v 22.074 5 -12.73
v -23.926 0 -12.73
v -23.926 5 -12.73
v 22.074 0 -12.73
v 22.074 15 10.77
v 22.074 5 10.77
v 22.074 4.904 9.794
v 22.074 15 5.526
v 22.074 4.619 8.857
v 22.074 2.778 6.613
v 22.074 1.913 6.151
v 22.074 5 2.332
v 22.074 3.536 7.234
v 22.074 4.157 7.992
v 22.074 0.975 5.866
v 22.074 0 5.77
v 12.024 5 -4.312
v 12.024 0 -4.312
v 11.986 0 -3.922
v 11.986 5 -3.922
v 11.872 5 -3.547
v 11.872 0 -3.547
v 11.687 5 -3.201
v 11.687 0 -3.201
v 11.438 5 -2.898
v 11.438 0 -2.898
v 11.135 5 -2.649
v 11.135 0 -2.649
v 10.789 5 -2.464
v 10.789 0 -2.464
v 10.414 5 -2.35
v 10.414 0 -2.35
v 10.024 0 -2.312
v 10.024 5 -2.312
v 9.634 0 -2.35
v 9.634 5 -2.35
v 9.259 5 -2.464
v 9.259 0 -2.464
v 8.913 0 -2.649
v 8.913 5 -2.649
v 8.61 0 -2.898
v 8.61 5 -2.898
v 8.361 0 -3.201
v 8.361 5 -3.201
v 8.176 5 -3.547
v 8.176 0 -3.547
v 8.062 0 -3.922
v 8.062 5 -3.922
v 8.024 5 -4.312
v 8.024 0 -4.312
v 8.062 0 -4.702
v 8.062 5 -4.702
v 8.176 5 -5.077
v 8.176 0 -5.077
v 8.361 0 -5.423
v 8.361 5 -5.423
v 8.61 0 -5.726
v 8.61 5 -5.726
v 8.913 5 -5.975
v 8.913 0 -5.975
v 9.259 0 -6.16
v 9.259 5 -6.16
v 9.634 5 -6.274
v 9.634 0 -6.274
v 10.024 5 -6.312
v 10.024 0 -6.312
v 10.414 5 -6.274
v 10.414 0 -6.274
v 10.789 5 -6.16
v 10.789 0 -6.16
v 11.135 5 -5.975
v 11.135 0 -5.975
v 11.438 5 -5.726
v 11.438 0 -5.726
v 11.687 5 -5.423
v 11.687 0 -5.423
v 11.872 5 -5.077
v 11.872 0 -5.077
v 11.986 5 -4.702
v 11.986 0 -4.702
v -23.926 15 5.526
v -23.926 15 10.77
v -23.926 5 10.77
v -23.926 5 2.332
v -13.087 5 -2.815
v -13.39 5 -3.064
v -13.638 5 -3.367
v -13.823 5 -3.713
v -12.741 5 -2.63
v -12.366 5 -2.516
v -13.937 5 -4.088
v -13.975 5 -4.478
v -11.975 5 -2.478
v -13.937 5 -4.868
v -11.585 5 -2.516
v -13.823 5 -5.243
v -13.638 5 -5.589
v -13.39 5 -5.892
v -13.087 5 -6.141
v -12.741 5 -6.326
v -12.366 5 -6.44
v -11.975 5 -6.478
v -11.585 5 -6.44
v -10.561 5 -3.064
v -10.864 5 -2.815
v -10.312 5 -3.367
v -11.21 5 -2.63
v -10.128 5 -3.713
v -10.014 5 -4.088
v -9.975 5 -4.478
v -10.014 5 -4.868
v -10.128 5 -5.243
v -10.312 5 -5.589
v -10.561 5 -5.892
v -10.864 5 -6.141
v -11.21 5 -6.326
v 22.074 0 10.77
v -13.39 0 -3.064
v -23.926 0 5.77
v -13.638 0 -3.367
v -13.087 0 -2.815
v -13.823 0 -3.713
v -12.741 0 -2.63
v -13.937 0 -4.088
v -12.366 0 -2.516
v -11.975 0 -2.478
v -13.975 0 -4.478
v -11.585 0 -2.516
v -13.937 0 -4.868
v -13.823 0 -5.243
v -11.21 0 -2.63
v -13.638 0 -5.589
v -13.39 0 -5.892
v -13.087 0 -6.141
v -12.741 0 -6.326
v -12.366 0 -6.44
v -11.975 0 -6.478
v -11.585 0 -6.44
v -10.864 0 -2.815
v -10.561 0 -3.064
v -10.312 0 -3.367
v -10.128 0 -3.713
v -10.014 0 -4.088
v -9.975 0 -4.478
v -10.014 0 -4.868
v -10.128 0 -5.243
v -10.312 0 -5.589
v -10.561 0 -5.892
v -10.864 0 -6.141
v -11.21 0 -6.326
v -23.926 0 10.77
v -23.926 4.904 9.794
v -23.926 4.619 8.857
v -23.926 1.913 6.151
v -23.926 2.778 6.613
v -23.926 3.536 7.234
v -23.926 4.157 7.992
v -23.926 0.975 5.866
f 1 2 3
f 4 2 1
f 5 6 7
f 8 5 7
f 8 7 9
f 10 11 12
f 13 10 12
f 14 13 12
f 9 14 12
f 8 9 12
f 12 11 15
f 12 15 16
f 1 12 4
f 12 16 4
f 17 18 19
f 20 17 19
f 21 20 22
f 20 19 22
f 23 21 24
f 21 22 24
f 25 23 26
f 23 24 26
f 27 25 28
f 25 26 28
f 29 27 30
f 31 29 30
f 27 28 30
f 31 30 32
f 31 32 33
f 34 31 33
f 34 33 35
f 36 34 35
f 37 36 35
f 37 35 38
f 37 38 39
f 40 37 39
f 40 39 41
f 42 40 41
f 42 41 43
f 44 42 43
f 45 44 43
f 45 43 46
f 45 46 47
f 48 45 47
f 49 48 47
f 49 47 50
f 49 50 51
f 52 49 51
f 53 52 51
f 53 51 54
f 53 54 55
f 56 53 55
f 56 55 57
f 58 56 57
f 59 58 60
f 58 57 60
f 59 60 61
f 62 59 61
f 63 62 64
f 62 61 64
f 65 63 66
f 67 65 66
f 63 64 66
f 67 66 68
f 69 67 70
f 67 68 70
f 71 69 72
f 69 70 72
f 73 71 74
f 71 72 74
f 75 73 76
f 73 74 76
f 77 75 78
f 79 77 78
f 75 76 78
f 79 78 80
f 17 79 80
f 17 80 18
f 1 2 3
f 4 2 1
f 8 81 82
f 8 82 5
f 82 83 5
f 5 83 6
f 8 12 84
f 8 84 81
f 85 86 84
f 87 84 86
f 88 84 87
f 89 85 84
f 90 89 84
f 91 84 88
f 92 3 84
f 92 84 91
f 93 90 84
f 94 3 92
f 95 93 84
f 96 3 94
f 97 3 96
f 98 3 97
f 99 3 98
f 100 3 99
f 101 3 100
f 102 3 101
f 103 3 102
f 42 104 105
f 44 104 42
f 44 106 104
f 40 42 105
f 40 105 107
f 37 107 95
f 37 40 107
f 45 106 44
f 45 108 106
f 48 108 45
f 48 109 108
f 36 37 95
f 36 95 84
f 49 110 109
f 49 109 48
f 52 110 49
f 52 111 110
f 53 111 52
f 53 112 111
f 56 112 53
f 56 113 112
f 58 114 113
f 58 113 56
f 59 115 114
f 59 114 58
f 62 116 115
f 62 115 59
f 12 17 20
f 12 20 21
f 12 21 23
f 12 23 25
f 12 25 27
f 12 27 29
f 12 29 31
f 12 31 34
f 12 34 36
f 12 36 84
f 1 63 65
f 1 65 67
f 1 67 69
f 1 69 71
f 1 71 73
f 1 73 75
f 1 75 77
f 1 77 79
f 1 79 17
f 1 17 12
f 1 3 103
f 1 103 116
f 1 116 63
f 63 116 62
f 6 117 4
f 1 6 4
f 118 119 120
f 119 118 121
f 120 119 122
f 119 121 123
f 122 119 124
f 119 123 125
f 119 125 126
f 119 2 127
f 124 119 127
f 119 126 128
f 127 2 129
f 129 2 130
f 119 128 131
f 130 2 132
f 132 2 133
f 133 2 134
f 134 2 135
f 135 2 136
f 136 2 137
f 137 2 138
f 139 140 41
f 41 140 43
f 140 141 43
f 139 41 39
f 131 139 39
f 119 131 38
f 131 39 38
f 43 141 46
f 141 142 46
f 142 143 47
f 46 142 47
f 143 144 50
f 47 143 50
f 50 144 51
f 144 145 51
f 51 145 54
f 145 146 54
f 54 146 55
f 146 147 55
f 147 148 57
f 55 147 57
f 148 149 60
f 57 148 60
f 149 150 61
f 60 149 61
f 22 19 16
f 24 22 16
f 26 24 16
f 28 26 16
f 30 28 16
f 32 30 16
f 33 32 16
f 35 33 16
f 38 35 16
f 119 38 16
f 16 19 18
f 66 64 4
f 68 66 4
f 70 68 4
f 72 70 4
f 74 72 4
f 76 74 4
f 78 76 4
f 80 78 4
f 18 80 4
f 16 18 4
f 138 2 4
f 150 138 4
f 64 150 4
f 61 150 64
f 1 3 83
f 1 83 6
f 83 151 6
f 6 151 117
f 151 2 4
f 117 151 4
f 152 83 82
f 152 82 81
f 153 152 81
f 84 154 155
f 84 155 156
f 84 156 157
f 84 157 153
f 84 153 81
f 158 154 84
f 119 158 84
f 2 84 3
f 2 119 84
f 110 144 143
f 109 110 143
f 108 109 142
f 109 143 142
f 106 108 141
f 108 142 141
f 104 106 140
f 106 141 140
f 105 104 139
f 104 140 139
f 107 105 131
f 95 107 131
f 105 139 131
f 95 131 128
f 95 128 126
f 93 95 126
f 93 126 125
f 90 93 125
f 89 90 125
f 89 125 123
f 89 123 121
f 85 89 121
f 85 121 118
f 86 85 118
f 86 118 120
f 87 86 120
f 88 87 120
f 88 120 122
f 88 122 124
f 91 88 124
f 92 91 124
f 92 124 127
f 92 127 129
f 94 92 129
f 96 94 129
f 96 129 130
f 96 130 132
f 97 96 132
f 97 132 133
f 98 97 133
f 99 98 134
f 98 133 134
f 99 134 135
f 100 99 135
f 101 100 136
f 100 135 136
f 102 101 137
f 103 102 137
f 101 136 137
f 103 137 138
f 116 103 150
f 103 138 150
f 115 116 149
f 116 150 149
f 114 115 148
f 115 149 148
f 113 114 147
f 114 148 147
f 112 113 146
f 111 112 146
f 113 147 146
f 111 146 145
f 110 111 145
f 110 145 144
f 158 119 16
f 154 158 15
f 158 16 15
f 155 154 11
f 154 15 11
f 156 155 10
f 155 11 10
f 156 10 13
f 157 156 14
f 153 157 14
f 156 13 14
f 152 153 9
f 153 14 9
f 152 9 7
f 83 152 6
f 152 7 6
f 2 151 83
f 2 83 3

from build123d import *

# Parameters (mm, degrees)
SKETCH1_W               = 46
SKETCH1_H               = 23.5
BOSS_EXTRUDE1_DEPTH     = 5
SKETCH2_W               = 46
SKETCH2_H               = 10.437907818
BOSS_EXTRUDE2_DEPTH     = 10
SKETCH1_2_W             = 46
SKETCH1_2_H             = 23.5
BOSS_EXTRUDE3_DEPTH     = 5
SKETCH3_R               = 2
CUT_EXTRUDE1_DEPTH      = 10
SKETCH4_R               = 5
CUT_EXTRUDE2_DEPTH      = 1
CUT_EXTRUDE2_DEPTH_BACK = 47


with BuildPart() as part:
    # Sketch1 → Boss-Extrude1 (new body)
    with BuildSketch(Plane(origin=(0, 0, 0), x_dir=(1, 0, 0), z_dir=(0, 1, 0))):
        with Locations((-0.926380368, 0.98006135)):
            Rectangle(SKETCH1_W, SKETCH1_H)
    extrude(amount=BOSS_EXTRUDE1_DEPTH)


with BuildPart() as body_2:
    # Sketch2 → Boss-Extrude2 (new body)
    with BuildSketch(Plane(origin=(0, 5, 0), x_dir=(1, 0, 0), z_dir=(0, 1, 0))):
        with Locations((-0.926380368, -5.550984741)):
            Rectangle(SKETCH2_W, SKETCH2_H)
    extrude(amount=BOSS_EXTRUDE2_DEPTH)

    # Sketch1<2> → Boss-Extrude3 (add)
    with BuildSketch(Plane(origin=(0, 0, 0), x_dir=(1, 0, 0), z_dir=(0, 1, 0))):
        with Locations((-0.926380368, 0.98006135)):
            Rectangle(SKETCH1_2_W, SKETCH1_2_H)
    extrude(amount=BOSS_EXTRUDE3_DEPTH)

    # Sketch3 → Cut-Extrude1 (cut)
    with BuildSketch(Plane.XZ):
        with Locations((10.02395927, -4.311969164)):
            Circle(SKETCH3_R)
        with Locations((-11.975411965, -4.478063294)):
            Circle(SKETCH3_R)
    extrude(amount=-CUT_EXTRUDE1_DEPTH, mode=Mode.SUBTRACT)

    # Sketch4 → Cut-Extrude2 (cut, two sides)
    with BuildSketch(Plane(origin=(22.073619632, 0, 0), x_dir=(0, 0, -1), z_dir=(1, 0, 0))) as cut_extrude2_sk:
        with Locations((-10.76993865, 0)):
            Circle(SKETCH4_R)
        Polygon((-0.332030832, 5), (-2.332030832, 5), (-5.525505132, 15), (-0.332030832, 15), align=None)
    extrude(amount=CUT_EXTRUDE2_DEPTH, mode=Mode.SUBTRACT)
    extrude(cut_extrude2_sk.sketch, amount=-CUT_EXTRUDE2_DEPTH_BACK, mode=Mode.SUBTRACT)


solid = Compound([part.part, body_2.part])
